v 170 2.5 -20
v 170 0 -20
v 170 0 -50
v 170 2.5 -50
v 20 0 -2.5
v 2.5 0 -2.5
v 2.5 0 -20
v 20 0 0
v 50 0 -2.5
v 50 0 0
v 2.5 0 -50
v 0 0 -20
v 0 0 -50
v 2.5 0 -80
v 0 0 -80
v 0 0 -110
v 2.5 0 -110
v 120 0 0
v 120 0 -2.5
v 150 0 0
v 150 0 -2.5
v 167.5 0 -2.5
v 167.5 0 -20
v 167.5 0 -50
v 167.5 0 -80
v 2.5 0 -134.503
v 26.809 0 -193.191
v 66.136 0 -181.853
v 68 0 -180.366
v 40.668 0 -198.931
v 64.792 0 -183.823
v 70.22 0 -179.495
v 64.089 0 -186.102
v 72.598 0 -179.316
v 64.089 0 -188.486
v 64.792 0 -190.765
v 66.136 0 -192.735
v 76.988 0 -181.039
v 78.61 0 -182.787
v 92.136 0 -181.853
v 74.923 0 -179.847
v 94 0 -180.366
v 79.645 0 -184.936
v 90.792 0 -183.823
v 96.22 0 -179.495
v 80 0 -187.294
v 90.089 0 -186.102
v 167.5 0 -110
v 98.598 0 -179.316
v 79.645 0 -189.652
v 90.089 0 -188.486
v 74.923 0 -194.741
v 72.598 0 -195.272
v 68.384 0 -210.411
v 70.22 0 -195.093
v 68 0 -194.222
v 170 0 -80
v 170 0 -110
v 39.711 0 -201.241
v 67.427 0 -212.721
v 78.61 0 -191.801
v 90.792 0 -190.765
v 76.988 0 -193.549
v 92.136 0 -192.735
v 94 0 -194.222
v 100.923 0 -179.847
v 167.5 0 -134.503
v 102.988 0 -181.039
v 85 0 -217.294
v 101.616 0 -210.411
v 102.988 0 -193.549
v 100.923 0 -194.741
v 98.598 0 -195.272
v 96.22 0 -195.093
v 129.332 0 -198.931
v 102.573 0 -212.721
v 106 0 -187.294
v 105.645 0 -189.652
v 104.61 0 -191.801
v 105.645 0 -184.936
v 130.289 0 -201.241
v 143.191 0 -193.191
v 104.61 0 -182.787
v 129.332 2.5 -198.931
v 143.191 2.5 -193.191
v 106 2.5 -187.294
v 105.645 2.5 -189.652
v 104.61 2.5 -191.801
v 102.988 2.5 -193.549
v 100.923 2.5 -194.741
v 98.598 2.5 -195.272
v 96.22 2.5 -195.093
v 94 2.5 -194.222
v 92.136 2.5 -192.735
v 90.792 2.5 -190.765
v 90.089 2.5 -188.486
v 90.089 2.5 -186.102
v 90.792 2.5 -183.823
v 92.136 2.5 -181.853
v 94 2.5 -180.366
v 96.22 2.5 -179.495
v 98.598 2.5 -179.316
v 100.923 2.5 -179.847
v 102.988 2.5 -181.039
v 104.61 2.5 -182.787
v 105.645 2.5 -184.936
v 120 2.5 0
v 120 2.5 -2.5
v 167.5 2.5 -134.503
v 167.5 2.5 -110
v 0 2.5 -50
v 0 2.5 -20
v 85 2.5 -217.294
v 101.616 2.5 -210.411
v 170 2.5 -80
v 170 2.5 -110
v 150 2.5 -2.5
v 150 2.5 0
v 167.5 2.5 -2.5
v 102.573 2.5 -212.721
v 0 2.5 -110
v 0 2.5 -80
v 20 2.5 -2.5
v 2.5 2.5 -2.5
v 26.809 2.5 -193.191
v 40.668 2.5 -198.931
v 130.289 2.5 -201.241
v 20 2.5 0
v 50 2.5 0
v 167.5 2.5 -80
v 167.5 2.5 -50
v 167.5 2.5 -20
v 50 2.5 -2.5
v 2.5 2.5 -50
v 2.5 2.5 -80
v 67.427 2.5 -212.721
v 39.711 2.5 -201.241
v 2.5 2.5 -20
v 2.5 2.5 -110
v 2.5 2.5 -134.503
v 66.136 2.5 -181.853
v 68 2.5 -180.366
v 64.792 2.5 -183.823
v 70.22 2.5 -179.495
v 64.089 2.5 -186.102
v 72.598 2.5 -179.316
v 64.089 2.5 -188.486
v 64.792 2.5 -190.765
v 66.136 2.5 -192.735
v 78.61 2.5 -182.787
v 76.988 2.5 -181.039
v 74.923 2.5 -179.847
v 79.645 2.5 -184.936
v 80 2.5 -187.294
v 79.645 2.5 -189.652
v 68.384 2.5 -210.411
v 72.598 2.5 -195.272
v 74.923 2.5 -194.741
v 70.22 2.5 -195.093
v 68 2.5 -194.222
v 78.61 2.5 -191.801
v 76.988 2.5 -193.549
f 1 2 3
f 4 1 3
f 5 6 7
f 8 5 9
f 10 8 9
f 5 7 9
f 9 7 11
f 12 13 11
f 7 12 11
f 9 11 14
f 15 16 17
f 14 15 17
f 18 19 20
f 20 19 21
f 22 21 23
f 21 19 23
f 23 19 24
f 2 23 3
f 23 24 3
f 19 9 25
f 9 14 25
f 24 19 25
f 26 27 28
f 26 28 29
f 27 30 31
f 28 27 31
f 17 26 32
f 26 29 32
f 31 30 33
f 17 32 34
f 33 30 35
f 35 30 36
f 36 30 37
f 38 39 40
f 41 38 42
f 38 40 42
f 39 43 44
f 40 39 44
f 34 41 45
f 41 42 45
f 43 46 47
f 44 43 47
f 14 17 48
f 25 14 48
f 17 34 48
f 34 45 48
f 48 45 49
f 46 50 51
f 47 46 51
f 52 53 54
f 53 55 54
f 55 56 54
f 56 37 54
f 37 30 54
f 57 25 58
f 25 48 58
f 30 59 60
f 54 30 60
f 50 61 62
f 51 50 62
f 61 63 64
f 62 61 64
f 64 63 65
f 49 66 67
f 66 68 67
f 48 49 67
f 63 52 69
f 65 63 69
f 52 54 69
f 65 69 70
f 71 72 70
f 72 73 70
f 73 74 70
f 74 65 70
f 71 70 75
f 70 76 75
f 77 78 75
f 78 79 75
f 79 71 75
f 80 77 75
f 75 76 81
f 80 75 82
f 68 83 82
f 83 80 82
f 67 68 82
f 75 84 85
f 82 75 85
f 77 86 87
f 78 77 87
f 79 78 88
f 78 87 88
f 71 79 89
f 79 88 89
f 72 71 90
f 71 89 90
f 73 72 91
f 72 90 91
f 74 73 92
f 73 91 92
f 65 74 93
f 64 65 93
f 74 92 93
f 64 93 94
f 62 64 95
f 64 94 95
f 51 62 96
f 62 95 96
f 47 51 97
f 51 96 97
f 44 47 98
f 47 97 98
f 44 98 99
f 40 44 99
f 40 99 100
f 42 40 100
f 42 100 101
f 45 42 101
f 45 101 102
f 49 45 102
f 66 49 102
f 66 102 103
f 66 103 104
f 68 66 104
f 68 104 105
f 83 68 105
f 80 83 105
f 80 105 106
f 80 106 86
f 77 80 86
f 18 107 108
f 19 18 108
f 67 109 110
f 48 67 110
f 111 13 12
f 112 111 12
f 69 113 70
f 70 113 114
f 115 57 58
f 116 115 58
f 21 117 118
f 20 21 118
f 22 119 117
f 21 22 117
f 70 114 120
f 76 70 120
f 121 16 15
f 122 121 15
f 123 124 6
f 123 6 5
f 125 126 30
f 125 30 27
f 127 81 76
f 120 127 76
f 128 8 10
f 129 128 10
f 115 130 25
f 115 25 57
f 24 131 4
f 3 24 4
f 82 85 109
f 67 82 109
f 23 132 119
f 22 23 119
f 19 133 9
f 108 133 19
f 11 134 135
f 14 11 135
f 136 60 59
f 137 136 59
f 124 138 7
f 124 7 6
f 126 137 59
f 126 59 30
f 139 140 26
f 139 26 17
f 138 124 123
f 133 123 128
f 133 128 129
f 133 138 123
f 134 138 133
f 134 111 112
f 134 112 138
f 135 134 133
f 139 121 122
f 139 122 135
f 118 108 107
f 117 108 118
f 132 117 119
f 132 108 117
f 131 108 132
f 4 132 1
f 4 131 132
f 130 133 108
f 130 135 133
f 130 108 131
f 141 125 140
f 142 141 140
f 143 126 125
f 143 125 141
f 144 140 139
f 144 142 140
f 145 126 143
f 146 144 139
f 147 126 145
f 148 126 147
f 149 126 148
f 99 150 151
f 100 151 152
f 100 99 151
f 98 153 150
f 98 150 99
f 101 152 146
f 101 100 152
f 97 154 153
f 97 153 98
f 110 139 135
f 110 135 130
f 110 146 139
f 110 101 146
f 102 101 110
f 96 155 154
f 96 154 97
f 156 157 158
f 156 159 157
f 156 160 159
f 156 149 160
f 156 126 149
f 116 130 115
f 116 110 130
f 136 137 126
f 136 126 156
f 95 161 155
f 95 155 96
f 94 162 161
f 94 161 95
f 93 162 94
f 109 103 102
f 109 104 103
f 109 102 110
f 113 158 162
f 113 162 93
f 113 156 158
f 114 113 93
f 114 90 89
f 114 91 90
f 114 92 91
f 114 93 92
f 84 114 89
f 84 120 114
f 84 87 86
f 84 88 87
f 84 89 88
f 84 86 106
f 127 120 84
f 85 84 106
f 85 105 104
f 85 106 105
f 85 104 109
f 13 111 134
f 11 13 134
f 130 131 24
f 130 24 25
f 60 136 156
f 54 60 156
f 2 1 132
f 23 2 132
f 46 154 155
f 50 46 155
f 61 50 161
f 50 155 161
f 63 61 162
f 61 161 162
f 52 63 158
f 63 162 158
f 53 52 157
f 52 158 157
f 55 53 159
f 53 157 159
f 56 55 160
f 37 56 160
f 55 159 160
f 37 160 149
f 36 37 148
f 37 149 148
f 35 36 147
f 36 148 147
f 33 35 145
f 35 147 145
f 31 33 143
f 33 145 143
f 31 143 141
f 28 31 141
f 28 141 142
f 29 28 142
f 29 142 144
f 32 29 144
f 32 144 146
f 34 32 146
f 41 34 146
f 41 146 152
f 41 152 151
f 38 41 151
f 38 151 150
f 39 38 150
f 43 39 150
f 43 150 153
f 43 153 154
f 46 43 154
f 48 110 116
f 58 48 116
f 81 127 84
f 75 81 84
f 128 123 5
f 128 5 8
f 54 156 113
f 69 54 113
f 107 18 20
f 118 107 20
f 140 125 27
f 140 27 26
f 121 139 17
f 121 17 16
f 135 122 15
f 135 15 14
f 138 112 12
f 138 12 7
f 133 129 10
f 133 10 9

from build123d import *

# Parameters (mm, degrees)
BOSS_EXTRUDE1_DEPTH = 2.5
SKETCH6_W           = 70
SKETCH6_H           = 2.5
SKETCH6_W_2         = 2.5
SKETCH6_H_2         = 30
CUT_EXTRUDE3_DEPTH  = 3.5
SKETCH7_R           = 8
CUT_EXTRUDE4_DEPTH  = 3.5


with BuildPart() as part:
    # Sketch2 → Boss-Extrude1 (new body)
    with BuildSketch(Plane(origin=(0, 0, 0), x_dir=(1, 0, 0), z_dir=(0, 1, 0))):
        Polygon((0, 0), (170, 0), (170, 135), (145.104076401, 195.104076401), (85, 220), (24.895923599, 195.104076401), (0, 135), align=None)
    extrude(amount=BOSS_EXTRUDE1_DEPTH)

    # Sketch6 → Cut-Extrude3 (cut, through all)
    with BuildSketch(Plane(origin=(0, 2.5, 0), x_dir=(1, 0, 0), z_dir=(0, 1, 0))):
        with Locations((85, 1.25)):
            Rectangle(SKETCH6_W, SKETCH6_H)
        Polygon((170, 0), (170, 20), (167.5, 20), (167.5, 2.5), (150, 2.5), (150, 0), align=None)
        Polygon((145.104076401, 195.104076401), (130.289174832, 201.240609556), (129.332466251, 198.930910725), (143.190659239, 193.190659239), (167.5, 134.502719082), (167.5, 110), (170, 110), (170, 135), align=None)
        with Locations((168.75, 65)):
            Rectangle(SKETCH6_W_2, SKETCH6_H_2)
        Polygon((101.616080276, 210.411413695), (102.572788857, 212.721112527), (85, 220), (67.427211143, 212.721112527), (68.383919724, 210.411413695), (85, 217.294019499), align=None)
        Polygon((0, 110), (0, 135), (24.895923599, 195.104076401), (39.710825168, 201.240609556), (40.667533749, 198.930910725), (26.809340761, 193.190659239), (2.5, 134.502719082), (2.5, 110), align=None)
        with Locations((1.25, 65)):
            Rectangle(SKETCH6_W_2, SKETCH6_H_2)
        Polygon((20, 0), (0, 0), (0, 20), (2.5, 20), (2.5, 2.5), (20, 2.5), align=None)
    extrude(amount=-CUT_EXTRUDE3_DEPTH, mode=Mode.SUBTRACT)

    # Sketch7 → Cut-Extrude4 (cut, through all)
    with BuildSketch(Plane(origin=(0, 2.5, 0), x_dir=(1, 0, 0), z_dir=(0, 1, 0))):
        with Locations((72, 187.294019499)):
            Circle(SKETCH7_R)
        with Locations((98, 187.294019499)):
            Circle(SKETCH7_R)
    extrude(amount=-CUT_EXTRUDE4_DEPTH, mode=Mode.SUBTRACT)


solid = part.part
